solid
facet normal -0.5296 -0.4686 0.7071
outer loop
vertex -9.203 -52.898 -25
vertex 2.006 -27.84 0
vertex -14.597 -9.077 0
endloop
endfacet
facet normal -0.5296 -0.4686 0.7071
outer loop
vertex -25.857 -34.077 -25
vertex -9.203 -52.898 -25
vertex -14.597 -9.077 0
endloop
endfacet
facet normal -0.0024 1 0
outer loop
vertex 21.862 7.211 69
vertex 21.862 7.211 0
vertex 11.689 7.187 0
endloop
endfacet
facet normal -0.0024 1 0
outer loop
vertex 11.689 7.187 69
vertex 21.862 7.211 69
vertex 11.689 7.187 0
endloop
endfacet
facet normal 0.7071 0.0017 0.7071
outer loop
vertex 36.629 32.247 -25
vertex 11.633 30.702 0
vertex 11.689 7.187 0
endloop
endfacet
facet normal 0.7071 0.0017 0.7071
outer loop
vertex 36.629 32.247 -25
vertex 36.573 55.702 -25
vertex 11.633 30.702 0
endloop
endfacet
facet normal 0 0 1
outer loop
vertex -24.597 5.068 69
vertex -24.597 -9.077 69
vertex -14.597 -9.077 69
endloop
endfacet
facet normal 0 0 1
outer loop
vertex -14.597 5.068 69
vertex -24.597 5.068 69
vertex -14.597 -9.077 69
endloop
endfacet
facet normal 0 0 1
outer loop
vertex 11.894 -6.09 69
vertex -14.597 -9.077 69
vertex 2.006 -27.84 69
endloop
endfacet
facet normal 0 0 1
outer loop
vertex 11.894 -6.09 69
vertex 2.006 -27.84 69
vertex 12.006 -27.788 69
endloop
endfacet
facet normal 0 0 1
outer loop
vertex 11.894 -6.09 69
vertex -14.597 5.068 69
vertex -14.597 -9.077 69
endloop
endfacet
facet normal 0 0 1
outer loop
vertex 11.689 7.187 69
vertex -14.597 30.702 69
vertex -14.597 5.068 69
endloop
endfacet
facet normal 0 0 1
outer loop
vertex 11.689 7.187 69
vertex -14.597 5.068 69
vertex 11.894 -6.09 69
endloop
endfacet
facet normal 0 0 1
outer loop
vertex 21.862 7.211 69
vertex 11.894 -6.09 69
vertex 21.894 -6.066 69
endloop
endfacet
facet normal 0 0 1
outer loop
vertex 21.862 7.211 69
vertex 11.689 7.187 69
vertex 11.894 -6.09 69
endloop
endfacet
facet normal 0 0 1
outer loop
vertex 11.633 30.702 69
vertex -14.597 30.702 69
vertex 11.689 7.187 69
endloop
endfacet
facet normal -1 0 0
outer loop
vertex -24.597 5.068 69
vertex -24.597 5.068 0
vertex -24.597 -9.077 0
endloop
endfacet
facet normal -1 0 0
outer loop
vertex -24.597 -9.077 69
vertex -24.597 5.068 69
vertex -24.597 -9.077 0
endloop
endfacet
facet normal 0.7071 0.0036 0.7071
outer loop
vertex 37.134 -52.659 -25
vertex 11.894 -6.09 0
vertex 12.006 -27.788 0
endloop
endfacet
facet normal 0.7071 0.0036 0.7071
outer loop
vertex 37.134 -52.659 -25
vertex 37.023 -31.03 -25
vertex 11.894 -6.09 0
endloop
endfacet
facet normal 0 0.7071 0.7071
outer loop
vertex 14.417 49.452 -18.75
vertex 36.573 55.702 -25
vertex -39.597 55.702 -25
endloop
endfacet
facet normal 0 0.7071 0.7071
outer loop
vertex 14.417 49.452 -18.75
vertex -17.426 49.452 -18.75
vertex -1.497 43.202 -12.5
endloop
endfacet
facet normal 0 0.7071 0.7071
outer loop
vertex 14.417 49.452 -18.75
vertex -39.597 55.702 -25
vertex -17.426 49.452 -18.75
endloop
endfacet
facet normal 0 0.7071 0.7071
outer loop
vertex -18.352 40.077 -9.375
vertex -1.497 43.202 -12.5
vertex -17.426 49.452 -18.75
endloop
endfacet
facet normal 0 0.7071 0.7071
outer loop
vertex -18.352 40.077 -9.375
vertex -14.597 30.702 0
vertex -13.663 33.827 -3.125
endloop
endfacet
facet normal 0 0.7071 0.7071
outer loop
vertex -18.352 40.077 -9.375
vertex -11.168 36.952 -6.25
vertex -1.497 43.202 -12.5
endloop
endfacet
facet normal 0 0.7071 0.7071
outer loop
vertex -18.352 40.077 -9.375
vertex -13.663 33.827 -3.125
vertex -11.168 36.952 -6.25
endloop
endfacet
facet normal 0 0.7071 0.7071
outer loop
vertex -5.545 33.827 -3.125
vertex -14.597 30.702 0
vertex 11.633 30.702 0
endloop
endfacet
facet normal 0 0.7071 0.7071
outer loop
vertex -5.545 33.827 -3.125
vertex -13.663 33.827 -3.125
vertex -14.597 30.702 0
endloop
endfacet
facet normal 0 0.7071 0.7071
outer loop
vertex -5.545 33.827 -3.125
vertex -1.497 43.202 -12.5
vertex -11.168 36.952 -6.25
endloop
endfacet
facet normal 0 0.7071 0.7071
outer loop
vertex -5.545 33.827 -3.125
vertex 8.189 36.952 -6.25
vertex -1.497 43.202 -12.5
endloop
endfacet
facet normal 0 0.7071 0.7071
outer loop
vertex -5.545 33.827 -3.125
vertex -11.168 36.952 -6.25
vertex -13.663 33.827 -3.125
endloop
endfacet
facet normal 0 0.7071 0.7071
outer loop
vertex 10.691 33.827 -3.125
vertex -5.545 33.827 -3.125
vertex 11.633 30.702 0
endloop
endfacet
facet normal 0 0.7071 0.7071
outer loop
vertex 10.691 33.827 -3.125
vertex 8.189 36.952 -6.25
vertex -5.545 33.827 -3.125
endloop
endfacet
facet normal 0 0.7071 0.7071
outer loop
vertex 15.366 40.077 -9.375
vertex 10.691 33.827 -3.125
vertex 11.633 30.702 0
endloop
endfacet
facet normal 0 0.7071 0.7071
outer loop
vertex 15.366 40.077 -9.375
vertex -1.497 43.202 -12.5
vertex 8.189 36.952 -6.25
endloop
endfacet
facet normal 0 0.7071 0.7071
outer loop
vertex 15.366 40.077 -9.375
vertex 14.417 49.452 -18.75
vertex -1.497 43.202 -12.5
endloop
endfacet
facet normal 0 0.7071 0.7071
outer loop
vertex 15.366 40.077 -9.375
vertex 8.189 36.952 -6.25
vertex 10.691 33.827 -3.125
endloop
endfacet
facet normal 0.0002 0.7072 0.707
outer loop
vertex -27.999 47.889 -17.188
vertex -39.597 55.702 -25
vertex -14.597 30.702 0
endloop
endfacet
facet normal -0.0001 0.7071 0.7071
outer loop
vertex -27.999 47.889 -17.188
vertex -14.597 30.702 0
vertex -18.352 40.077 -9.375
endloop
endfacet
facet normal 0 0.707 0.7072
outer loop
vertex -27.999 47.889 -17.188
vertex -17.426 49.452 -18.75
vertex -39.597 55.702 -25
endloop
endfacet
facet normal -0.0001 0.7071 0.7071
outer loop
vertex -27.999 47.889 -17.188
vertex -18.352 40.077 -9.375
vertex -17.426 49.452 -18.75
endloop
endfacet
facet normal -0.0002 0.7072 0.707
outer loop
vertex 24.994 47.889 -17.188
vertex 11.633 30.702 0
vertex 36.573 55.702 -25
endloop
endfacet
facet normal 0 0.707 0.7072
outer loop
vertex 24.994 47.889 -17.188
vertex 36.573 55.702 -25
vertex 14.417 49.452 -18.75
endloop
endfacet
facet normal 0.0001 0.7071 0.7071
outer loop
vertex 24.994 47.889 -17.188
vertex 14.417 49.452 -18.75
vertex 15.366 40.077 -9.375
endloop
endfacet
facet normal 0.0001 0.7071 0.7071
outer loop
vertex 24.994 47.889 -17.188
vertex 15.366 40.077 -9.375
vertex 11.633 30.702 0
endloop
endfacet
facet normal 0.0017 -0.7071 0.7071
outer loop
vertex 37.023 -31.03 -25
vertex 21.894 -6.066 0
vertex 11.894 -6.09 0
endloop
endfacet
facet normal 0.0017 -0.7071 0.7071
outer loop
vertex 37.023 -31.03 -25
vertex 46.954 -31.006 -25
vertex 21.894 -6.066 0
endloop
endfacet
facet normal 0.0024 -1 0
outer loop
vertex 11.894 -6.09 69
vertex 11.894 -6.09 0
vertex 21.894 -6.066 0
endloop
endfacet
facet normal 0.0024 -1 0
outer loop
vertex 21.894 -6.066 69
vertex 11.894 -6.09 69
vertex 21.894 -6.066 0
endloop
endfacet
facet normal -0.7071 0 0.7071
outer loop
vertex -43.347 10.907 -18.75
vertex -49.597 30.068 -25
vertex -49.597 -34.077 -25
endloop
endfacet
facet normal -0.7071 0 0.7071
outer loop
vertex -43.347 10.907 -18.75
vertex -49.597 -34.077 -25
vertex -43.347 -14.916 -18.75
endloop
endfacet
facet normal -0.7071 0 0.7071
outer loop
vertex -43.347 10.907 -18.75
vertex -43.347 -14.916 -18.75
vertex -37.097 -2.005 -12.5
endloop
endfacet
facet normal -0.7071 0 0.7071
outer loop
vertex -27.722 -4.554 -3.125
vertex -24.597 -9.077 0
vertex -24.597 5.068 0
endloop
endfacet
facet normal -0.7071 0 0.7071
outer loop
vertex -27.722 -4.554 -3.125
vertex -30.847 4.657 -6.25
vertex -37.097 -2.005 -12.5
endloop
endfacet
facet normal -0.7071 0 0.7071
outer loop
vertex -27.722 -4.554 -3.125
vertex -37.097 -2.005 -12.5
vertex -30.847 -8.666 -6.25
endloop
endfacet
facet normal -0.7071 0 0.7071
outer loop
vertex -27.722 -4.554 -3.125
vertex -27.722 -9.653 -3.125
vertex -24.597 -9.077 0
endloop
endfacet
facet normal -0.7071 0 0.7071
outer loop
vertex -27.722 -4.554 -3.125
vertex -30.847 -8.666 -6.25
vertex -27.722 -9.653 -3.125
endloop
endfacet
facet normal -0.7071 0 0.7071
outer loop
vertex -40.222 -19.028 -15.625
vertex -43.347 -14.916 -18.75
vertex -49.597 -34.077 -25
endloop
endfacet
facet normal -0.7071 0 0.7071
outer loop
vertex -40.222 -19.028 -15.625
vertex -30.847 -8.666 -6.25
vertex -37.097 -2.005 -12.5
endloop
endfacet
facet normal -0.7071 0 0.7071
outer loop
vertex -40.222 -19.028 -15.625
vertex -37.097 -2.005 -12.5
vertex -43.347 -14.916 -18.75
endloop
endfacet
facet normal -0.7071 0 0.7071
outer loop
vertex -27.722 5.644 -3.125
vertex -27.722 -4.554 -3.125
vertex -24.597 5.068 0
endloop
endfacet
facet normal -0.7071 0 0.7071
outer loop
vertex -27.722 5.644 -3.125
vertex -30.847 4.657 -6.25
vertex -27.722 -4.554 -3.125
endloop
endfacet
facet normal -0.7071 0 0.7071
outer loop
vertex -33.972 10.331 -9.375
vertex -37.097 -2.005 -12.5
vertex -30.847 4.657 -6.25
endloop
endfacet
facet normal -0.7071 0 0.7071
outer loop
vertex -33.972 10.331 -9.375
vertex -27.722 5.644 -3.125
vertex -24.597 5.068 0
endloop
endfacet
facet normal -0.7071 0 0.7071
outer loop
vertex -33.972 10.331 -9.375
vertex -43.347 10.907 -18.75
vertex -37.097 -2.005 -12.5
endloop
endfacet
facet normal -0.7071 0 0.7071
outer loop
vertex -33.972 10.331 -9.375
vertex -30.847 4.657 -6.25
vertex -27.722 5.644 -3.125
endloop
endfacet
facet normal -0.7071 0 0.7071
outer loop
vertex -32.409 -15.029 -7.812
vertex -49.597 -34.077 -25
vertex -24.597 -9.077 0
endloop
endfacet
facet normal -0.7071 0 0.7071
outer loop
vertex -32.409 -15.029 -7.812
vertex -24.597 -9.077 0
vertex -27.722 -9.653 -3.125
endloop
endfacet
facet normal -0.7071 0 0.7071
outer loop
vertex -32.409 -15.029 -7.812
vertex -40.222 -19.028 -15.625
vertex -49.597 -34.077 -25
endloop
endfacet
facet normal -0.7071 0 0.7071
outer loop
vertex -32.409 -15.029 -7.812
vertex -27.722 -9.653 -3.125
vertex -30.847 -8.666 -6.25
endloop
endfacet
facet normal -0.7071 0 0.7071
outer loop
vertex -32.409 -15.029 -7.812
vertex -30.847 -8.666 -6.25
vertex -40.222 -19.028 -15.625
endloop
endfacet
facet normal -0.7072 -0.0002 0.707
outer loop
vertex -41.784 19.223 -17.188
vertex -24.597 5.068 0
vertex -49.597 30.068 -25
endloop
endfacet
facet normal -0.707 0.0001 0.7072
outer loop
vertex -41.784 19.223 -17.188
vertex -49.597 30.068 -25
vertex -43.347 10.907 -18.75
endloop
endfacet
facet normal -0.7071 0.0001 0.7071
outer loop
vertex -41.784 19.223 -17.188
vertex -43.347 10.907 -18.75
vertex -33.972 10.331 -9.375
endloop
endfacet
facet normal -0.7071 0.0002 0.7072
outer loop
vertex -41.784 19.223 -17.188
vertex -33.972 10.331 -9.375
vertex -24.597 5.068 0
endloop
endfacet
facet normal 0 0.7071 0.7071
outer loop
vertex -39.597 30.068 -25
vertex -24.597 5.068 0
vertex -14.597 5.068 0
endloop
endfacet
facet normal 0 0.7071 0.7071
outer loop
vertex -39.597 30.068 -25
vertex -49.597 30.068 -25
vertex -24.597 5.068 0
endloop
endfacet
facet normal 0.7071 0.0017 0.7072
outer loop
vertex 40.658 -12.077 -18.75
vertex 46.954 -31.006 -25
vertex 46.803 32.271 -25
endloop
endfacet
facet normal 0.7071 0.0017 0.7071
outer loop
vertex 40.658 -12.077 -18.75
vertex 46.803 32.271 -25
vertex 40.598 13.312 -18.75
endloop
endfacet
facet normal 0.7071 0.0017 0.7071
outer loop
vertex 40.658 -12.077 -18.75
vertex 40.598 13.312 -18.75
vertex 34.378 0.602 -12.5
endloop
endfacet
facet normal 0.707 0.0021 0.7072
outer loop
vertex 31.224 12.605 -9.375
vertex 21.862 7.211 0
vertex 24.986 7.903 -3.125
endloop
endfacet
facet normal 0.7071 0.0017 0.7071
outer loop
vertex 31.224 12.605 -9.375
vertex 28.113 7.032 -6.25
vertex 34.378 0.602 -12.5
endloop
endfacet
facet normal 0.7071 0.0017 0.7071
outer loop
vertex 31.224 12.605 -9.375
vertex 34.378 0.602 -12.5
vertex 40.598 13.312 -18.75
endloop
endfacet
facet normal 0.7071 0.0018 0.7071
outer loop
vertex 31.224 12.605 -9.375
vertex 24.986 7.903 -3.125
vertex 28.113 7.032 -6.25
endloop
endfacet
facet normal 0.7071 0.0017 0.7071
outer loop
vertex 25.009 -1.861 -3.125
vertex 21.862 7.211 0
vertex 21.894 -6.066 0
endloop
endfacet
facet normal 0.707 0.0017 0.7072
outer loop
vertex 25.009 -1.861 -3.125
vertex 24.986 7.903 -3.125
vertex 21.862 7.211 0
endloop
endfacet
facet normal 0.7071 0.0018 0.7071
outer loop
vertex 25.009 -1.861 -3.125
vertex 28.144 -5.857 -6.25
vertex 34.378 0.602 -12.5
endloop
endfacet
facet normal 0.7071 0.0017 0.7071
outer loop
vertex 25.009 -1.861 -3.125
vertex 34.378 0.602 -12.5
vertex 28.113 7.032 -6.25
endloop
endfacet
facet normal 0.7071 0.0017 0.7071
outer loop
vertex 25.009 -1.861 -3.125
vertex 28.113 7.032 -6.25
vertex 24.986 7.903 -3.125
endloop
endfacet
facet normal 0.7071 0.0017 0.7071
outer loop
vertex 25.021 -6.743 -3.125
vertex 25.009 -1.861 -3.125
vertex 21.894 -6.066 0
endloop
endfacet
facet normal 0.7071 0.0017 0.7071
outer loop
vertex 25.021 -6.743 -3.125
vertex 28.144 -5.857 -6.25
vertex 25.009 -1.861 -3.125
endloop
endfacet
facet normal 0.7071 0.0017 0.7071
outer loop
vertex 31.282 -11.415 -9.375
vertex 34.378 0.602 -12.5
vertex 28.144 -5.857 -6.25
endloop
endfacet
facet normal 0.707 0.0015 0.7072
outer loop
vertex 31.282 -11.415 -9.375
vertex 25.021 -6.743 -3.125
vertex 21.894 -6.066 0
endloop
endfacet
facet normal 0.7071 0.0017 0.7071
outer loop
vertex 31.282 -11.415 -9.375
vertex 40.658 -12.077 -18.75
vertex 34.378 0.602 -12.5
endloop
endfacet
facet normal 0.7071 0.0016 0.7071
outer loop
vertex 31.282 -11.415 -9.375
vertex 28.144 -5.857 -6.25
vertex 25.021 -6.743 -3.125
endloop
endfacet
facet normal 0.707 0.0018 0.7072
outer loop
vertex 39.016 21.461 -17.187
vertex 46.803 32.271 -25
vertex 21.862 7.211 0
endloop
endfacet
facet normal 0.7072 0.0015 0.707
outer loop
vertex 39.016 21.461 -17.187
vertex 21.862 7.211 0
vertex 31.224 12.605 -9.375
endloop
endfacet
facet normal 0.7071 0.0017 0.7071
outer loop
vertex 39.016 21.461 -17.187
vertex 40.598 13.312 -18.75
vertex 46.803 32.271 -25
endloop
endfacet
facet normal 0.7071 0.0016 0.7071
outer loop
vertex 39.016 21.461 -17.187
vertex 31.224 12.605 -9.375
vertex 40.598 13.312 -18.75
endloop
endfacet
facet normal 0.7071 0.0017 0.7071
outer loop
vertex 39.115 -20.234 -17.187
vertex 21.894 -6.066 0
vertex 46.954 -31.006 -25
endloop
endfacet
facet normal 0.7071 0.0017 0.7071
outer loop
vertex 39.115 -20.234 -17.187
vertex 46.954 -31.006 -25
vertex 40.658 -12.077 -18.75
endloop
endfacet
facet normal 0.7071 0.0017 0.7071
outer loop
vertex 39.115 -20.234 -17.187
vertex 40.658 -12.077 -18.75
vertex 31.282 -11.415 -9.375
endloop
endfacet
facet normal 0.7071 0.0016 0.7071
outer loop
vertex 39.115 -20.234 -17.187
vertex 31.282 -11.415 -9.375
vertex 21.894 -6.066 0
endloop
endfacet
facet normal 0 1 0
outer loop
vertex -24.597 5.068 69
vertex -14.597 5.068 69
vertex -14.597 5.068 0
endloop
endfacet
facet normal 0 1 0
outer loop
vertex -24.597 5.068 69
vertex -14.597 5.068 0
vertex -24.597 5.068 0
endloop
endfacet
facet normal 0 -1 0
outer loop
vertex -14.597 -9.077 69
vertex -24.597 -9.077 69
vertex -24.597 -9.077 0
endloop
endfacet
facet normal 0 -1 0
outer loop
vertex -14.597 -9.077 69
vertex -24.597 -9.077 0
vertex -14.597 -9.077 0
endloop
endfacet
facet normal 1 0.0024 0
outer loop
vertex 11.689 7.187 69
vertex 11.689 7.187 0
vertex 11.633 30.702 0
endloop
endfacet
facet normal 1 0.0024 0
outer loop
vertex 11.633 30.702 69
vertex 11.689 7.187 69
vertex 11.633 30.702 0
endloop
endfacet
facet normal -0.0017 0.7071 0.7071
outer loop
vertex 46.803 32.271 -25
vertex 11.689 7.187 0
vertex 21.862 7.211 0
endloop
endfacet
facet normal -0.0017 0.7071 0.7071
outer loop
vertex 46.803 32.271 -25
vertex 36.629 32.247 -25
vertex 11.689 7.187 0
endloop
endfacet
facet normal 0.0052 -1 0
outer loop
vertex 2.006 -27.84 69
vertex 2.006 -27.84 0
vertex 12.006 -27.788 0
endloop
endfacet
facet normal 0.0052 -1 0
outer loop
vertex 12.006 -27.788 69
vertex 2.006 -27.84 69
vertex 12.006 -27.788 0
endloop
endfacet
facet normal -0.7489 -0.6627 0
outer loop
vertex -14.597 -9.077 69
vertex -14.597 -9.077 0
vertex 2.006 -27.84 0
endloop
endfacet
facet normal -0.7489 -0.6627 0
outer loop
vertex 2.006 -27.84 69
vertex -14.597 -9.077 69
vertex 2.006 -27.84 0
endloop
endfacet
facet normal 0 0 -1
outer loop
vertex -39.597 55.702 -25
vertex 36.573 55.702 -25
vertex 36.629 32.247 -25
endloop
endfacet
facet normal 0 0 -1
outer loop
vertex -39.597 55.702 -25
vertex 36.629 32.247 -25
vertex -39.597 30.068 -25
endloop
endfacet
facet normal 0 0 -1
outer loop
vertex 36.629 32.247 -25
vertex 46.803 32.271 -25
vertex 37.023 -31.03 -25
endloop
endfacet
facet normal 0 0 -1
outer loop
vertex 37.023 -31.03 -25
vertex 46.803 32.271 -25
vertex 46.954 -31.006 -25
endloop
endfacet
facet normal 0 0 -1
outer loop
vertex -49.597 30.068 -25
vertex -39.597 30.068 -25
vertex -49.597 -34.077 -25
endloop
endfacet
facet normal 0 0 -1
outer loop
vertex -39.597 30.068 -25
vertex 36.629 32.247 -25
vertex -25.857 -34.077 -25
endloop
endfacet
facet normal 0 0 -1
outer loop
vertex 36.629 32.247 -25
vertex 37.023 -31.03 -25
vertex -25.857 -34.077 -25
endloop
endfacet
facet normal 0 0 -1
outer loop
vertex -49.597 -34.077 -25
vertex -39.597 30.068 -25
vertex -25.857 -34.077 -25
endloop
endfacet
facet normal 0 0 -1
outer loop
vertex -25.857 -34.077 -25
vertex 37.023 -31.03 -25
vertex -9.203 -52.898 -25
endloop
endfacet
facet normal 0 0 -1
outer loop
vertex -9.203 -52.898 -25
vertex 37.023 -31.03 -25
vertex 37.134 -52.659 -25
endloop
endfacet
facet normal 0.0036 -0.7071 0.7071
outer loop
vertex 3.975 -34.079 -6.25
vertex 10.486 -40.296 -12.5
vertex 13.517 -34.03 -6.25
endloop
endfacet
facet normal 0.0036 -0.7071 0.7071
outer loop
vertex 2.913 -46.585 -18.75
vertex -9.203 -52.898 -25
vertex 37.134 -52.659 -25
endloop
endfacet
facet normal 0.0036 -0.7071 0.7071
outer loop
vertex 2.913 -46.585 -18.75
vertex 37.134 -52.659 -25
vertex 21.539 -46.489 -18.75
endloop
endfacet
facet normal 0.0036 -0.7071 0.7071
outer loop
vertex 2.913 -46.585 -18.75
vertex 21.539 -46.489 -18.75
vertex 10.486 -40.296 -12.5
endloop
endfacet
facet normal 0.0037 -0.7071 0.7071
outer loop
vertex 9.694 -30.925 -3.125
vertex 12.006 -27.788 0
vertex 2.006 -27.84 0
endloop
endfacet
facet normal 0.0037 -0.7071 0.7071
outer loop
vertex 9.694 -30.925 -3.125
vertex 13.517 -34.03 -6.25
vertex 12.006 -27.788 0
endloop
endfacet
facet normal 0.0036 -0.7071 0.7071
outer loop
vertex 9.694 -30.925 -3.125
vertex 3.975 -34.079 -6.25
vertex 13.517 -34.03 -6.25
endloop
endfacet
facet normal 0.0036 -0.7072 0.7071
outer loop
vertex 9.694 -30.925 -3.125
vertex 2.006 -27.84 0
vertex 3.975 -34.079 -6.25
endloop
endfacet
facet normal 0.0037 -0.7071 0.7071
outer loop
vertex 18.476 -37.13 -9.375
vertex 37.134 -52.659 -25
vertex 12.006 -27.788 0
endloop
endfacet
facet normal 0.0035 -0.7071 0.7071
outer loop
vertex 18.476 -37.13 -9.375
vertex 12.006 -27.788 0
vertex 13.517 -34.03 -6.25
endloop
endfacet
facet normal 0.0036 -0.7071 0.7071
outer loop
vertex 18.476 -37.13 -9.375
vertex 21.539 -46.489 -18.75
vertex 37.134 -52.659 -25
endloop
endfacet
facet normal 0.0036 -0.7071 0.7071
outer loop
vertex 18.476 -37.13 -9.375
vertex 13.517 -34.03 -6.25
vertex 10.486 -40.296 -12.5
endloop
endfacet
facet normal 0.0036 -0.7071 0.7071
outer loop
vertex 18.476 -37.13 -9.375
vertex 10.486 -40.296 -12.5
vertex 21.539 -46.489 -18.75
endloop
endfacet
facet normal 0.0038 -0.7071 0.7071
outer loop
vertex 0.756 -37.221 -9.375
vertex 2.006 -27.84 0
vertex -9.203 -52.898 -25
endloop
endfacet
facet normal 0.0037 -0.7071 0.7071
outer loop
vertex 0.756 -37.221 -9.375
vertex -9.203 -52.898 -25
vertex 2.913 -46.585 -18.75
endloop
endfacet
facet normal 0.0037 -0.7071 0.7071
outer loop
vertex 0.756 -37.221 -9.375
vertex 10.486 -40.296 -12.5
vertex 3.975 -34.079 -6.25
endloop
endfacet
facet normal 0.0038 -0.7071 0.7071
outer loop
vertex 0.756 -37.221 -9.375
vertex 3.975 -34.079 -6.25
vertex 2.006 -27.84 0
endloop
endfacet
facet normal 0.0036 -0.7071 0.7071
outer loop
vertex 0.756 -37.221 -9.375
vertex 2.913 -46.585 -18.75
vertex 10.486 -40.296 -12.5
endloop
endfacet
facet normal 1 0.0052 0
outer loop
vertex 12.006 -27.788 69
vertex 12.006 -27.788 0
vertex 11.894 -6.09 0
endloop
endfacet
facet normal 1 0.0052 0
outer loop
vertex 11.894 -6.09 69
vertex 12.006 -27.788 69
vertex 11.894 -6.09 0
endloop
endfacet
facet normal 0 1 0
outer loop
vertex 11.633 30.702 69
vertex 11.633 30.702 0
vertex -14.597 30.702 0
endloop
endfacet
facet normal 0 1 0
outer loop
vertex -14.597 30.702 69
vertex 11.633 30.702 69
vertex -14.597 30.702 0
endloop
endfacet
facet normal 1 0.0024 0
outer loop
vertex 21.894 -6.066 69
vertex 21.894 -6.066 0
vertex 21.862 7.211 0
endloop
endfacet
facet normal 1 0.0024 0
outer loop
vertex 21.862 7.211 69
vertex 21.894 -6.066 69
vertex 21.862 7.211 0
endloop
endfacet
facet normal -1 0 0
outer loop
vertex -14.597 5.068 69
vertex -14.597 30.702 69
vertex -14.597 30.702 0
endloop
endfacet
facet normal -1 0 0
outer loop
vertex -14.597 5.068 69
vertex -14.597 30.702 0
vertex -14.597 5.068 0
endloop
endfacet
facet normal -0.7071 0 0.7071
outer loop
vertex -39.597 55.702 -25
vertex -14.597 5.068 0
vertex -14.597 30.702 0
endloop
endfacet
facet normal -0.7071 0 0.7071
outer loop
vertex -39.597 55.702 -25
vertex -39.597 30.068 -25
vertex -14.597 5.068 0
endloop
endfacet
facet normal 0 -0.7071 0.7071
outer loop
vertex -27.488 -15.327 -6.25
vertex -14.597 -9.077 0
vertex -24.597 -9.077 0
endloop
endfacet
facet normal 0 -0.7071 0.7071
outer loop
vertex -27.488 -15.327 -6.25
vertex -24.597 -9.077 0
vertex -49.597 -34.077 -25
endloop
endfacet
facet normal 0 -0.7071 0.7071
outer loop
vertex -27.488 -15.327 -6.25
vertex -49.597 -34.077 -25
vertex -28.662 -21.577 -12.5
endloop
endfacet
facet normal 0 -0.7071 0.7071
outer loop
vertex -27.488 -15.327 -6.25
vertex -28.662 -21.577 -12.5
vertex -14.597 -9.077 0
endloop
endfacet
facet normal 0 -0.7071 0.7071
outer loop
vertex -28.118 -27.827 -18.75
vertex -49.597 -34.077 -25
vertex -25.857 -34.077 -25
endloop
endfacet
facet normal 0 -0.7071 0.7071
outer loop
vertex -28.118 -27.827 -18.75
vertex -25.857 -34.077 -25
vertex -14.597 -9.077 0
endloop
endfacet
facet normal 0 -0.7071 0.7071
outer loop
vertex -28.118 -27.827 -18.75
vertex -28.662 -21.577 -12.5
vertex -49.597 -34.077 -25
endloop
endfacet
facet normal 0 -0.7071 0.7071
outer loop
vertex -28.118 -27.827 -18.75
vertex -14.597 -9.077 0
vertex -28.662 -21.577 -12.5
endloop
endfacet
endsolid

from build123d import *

# Parameters (mm, degrees)
F1_DEPTH = 25
F4_DEPTH = 69
F5_DEPTH = 25
F5_TAPER = -45


with BuildPart() as f1:
    # F0 (on Front) → F1 (new body)
    with BuildSketch(Plane.XZ):
        Polygon((-37.9215627909, 0), (-25.2369977534, 0), (-4.096057266, -27.3510906845), (10.9668616205, -27.3510906845), (10.9668616205, 0), (20.2160235494, 0), (20.2160235494, 10.7026007026), (11.2311234698, 10.7026007026), (11.495385319, 24.444213137), (-26.5543982792, 25.1759399431), (-26.5543982792, 12.0239099488), (-37.9215627909, 12.0239099488), align=None)
    extrude(amount=F1_DEPTH)


with BuildPart() as f4:
    # F3 (on Top) → F4 (new body)
    with BuildSketch(Plane.XY):
        Polygon((-24.5968098739, -9.0773625368), (-14.5968098739, -9.0773625368), (2.0060510084, -27.8395099328), (12.0059180895, -27.7879506378), (11.8940432243, -6.0899467872), (21.8940147673, -6.0660901471), (21.8623394592, 7.2112271297), (11.6888906335, 7.1869566299), (11.6327921873, 30.701704037), (-14.5968098739, 30.701704037), (-14.5968098739, 5.0683153725), (-24.5968098739, 5.0683153725), align=None)
    extrude(amount=F4_DEPTH)

    # F4_face (on face) → F5 (join)
    with BuildSketch(Plane(origin=(-0.7630345516, 3.1523470062, 0), x_dir=(1, 0, 0), z_dir=(0, 0, -1))):
        Polygon((12.3958267389, -27.5493570308), (12.4519251851, -4.0346096237), (22.6253740108, -4.0588801235), (22.6570493189, 9.2184371533), (12.6570777759, 9.2422937934), (12.768952641, 30.940297644), (2.76908556, 30.991856939), (-13.8337753223, 12.229709543), (-23.8337753223, 12.229709543), (-23.8337753223, -1.9159683663), (-13.8337753223, -1.9159683663), (-13.8337753223, -27.5493570308), align=None)
    extrude(amount=F5_DEPTH, taper=F5_TAPER)


solid = f4.part
